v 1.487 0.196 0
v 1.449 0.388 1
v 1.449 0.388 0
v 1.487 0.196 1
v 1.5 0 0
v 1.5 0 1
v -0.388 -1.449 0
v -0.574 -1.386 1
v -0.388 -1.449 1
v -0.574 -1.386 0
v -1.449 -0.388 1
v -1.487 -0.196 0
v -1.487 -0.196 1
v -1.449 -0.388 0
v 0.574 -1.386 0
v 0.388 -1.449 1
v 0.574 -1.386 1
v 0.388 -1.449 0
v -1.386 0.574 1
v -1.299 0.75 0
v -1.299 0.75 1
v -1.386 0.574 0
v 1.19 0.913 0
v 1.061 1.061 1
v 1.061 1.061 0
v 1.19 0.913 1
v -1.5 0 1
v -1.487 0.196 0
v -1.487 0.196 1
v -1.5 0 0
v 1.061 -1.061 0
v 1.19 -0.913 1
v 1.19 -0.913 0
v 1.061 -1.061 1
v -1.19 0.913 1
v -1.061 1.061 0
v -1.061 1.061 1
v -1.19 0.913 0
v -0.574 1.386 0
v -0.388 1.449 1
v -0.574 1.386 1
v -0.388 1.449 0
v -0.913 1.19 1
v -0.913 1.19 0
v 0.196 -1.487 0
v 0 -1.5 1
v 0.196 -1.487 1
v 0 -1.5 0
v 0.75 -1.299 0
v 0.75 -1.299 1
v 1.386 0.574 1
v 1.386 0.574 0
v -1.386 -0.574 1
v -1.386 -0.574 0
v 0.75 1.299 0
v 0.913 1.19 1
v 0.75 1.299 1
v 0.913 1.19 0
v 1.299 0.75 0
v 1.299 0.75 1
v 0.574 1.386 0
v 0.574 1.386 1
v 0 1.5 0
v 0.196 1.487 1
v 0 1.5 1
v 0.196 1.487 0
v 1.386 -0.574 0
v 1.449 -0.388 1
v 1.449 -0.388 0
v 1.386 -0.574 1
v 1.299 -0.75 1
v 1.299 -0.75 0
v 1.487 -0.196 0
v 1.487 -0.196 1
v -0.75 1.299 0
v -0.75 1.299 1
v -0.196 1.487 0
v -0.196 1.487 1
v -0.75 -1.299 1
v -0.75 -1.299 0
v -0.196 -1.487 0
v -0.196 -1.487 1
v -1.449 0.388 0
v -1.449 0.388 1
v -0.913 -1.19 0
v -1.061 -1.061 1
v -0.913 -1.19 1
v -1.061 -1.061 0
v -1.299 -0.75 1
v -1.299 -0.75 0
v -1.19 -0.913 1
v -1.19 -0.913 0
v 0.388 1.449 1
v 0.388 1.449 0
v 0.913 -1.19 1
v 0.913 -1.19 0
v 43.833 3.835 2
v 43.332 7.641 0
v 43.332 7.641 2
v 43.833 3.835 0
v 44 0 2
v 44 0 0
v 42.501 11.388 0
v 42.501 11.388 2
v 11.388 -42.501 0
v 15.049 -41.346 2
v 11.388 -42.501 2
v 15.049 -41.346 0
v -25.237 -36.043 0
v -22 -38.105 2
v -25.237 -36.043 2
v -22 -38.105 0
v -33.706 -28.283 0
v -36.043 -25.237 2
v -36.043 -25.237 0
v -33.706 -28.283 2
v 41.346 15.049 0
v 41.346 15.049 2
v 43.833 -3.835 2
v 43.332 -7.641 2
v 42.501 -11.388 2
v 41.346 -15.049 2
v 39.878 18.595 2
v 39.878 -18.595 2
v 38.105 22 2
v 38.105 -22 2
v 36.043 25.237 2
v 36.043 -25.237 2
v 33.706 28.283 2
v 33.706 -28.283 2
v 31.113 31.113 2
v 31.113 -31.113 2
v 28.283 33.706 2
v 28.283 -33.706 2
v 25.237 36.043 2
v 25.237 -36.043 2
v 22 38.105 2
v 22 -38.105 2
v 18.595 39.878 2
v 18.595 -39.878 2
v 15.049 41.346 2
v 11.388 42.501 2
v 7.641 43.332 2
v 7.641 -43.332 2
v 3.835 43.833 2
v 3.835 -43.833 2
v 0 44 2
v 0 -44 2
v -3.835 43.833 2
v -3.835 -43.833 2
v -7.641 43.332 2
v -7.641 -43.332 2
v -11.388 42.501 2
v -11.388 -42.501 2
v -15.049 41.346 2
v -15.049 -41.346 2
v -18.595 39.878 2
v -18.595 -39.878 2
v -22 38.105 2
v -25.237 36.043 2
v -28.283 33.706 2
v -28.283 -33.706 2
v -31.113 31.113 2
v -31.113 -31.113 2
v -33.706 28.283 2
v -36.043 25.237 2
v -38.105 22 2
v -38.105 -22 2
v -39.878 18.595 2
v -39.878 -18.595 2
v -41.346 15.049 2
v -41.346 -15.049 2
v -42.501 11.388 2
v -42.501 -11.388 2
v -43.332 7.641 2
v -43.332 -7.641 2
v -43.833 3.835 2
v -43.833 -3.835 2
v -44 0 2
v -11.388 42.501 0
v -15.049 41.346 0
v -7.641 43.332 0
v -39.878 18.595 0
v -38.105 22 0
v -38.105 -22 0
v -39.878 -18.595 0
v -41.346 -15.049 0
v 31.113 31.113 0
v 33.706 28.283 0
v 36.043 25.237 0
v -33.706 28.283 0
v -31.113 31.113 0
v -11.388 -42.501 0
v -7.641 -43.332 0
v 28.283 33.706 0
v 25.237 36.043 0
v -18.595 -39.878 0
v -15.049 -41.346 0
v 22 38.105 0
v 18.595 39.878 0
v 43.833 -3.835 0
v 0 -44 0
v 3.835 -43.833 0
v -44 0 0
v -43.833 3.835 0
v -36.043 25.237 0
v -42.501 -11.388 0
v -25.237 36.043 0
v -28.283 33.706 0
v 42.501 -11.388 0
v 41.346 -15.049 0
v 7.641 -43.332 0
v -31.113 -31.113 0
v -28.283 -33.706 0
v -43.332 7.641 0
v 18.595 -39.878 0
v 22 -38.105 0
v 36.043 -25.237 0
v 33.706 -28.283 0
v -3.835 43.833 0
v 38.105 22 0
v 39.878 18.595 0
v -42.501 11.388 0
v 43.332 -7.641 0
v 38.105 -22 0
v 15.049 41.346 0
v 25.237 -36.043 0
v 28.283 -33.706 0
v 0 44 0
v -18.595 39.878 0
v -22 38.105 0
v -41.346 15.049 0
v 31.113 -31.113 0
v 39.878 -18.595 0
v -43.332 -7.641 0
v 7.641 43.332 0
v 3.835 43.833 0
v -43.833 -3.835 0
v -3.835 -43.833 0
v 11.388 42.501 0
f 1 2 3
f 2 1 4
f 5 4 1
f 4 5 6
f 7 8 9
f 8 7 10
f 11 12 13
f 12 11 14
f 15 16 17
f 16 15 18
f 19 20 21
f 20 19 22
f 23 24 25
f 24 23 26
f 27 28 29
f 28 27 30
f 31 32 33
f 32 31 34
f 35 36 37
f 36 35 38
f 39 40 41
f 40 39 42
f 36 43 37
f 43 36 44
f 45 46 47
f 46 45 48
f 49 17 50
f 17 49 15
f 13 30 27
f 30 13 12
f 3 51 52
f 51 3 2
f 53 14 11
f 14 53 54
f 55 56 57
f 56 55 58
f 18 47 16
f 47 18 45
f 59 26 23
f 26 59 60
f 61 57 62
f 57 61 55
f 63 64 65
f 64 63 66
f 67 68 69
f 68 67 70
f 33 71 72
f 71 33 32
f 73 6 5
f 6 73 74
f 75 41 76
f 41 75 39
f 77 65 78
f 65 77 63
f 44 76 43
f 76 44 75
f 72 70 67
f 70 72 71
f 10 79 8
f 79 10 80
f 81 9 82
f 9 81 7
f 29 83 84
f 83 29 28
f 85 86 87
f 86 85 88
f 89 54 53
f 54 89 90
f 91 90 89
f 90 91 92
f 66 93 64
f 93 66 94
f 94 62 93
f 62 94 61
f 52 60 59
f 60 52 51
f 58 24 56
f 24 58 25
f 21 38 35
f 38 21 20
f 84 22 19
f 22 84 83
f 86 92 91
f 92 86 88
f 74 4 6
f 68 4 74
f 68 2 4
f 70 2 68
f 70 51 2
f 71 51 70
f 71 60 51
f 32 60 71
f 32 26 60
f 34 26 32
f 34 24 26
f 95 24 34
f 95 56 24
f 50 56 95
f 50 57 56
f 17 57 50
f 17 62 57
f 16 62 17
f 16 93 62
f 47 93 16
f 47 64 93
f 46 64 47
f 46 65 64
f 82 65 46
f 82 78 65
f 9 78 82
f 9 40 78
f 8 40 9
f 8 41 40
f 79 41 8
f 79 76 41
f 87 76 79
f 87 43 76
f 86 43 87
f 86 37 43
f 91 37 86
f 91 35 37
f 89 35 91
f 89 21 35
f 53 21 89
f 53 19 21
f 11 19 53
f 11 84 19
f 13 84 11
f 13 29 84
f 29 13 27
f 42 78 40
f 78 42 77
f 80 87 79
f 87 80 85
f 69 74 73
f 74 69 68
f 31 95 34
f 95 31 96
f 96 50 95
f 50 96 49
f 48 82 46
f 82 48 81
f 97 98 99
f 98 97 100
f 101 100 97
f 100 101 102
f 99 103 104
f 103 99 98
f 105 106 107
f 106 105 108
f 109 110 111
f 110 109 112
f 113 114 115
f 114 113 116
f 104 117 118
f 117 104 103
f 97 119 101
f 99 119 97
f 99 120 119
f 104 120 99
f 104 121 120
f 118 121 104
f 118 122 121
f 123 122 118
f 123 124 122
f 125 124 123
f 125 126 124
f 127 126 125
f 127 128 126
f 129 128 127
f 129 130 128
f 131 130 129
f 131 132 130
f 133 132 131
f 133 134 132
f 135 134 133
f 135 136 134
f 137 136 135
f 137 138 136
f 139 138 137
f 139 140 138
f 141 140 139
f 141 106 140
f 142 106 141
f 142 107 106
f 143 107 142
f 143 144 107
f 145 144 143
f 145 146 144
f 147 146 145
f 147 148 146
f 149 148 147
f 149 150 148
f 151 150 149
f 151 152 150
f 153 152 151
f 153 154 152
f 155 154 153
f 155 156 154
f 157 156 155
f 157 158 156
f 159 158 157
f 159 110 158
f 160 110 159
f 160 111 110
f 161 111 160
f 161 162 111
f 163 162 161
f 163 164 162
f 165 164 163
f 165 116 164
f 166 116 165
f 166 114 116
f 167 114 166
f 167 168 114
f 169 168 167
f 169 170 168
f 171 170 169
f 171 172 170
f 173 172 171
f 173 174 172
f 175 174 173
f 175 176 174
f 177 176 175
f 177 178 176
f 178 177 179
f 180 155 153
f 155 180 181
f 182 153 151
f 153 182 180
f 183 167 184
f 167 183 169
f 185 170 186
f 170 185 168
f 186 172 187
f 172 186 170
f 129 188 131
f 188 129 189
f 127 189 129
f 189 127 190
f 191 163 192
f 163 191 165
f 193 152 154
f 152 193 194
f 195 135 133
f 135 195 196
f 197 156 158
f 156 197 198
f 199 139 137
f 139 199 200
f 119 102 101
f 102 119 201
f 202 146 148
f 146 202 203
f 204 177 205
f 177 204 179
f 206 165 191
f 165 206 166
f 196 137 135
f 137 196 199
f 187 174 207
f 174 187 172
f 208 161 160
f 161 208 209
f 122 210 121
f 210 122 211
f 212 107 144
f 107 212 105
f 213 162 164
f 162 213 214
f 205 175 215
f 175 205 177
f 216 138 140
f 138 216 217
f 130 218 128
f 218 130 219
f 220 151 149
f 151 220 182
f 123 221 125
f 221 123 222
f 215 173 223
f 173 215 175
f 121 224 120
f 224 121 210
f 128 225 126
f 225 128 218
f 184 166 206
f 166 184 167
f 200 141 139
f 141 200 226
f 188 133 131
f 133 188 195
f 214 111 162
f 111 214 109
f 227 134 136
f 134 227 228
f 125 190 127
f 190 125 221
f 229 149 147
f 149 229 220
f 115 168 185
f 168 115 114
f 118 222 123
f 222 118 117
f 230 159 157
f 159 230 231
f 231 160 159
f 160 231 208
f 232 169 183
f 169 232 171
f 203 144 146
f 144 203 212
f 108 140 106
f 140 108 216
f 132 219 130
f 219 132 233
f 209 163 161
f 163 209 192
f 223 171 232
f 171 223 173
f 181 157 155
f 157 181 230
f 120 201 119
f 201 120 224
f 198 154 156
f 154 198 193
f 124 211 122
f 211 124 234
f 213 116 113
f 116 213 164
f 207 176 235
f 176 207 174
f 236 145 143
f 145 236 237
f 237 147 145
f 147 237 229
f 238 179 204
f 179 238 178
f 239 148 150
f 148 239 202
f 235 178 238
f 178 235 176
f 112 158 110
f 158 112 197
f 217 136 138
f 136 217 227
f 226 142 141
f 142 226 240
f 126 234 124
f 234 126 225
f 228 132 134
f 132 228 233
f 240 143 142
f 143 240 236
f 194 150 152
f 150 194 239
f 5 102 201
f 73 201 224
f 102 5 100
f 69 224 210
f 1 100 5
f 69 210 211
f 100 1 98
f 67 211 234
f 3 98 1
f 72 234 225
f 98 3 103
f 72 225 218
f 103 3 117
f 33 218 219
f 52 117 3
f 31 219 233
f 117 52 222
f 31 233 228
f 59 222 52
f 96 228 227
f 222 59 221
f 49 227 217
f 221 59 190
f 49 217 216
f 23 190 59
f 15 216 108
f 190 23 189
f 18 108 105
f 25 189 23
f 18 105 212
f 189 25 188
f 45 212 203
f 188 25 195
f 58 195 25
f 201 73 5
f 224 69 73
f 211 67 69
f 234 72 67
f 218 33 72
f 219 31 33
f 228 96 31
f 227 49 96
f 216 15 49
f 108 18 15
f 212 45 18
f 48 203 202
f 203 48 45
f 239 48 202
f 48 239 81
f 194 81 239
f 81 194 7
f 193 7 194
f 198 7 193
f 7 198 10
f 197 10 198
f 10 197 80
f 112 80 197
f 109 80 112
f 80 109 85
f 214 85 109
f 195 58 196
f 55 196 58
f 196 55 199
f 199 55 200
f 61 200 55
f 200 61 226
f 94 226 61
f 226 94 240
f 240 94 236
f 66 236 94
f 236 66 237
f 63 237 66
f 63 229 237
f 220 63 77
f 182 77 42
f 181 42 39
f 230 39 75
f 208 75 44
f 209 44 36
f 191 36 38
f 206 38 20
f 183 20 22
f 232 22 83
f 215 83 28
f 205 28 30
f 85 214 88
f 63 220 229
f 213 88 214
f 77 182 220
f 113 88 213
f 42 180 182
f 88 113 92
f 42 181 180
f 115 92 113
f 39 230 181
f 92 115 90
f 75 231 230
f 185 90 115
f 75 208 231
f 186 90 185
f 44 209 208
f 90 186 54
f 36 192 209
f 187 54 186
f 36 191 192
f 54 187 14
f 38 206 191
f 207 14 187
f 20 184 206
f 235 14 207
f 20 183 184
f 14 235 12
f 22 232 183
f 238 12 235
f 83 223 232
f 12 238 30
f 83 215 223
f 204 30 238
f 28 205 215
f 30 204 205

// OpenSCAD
// Petri dish sowing template - a flat disc with a regular grid of through-holes for seeding
// or small fasteners, with an orientation notch in the rim. NOVEL general part.
//

dish_d = 90;
t      = 2;
holes  = [7, 7];
hole_d = 3;
pitch  = 9;
notch  = [10, 4];

$fn = 72;

flange = dish_d - 2;

difference() {
    cylinder(h = t, d = flange);
    for (i = [0 : holes[0] - 1], j = [0 : holes[1] - 1])
        translate([0, 0, -1]) cylinder(h = t + 2, d = hole_d,
            center = true, $fn = 48);
    translate([flange / 2, 0, -1]) cube([notch[0], notch[1], t + 2]);
}
